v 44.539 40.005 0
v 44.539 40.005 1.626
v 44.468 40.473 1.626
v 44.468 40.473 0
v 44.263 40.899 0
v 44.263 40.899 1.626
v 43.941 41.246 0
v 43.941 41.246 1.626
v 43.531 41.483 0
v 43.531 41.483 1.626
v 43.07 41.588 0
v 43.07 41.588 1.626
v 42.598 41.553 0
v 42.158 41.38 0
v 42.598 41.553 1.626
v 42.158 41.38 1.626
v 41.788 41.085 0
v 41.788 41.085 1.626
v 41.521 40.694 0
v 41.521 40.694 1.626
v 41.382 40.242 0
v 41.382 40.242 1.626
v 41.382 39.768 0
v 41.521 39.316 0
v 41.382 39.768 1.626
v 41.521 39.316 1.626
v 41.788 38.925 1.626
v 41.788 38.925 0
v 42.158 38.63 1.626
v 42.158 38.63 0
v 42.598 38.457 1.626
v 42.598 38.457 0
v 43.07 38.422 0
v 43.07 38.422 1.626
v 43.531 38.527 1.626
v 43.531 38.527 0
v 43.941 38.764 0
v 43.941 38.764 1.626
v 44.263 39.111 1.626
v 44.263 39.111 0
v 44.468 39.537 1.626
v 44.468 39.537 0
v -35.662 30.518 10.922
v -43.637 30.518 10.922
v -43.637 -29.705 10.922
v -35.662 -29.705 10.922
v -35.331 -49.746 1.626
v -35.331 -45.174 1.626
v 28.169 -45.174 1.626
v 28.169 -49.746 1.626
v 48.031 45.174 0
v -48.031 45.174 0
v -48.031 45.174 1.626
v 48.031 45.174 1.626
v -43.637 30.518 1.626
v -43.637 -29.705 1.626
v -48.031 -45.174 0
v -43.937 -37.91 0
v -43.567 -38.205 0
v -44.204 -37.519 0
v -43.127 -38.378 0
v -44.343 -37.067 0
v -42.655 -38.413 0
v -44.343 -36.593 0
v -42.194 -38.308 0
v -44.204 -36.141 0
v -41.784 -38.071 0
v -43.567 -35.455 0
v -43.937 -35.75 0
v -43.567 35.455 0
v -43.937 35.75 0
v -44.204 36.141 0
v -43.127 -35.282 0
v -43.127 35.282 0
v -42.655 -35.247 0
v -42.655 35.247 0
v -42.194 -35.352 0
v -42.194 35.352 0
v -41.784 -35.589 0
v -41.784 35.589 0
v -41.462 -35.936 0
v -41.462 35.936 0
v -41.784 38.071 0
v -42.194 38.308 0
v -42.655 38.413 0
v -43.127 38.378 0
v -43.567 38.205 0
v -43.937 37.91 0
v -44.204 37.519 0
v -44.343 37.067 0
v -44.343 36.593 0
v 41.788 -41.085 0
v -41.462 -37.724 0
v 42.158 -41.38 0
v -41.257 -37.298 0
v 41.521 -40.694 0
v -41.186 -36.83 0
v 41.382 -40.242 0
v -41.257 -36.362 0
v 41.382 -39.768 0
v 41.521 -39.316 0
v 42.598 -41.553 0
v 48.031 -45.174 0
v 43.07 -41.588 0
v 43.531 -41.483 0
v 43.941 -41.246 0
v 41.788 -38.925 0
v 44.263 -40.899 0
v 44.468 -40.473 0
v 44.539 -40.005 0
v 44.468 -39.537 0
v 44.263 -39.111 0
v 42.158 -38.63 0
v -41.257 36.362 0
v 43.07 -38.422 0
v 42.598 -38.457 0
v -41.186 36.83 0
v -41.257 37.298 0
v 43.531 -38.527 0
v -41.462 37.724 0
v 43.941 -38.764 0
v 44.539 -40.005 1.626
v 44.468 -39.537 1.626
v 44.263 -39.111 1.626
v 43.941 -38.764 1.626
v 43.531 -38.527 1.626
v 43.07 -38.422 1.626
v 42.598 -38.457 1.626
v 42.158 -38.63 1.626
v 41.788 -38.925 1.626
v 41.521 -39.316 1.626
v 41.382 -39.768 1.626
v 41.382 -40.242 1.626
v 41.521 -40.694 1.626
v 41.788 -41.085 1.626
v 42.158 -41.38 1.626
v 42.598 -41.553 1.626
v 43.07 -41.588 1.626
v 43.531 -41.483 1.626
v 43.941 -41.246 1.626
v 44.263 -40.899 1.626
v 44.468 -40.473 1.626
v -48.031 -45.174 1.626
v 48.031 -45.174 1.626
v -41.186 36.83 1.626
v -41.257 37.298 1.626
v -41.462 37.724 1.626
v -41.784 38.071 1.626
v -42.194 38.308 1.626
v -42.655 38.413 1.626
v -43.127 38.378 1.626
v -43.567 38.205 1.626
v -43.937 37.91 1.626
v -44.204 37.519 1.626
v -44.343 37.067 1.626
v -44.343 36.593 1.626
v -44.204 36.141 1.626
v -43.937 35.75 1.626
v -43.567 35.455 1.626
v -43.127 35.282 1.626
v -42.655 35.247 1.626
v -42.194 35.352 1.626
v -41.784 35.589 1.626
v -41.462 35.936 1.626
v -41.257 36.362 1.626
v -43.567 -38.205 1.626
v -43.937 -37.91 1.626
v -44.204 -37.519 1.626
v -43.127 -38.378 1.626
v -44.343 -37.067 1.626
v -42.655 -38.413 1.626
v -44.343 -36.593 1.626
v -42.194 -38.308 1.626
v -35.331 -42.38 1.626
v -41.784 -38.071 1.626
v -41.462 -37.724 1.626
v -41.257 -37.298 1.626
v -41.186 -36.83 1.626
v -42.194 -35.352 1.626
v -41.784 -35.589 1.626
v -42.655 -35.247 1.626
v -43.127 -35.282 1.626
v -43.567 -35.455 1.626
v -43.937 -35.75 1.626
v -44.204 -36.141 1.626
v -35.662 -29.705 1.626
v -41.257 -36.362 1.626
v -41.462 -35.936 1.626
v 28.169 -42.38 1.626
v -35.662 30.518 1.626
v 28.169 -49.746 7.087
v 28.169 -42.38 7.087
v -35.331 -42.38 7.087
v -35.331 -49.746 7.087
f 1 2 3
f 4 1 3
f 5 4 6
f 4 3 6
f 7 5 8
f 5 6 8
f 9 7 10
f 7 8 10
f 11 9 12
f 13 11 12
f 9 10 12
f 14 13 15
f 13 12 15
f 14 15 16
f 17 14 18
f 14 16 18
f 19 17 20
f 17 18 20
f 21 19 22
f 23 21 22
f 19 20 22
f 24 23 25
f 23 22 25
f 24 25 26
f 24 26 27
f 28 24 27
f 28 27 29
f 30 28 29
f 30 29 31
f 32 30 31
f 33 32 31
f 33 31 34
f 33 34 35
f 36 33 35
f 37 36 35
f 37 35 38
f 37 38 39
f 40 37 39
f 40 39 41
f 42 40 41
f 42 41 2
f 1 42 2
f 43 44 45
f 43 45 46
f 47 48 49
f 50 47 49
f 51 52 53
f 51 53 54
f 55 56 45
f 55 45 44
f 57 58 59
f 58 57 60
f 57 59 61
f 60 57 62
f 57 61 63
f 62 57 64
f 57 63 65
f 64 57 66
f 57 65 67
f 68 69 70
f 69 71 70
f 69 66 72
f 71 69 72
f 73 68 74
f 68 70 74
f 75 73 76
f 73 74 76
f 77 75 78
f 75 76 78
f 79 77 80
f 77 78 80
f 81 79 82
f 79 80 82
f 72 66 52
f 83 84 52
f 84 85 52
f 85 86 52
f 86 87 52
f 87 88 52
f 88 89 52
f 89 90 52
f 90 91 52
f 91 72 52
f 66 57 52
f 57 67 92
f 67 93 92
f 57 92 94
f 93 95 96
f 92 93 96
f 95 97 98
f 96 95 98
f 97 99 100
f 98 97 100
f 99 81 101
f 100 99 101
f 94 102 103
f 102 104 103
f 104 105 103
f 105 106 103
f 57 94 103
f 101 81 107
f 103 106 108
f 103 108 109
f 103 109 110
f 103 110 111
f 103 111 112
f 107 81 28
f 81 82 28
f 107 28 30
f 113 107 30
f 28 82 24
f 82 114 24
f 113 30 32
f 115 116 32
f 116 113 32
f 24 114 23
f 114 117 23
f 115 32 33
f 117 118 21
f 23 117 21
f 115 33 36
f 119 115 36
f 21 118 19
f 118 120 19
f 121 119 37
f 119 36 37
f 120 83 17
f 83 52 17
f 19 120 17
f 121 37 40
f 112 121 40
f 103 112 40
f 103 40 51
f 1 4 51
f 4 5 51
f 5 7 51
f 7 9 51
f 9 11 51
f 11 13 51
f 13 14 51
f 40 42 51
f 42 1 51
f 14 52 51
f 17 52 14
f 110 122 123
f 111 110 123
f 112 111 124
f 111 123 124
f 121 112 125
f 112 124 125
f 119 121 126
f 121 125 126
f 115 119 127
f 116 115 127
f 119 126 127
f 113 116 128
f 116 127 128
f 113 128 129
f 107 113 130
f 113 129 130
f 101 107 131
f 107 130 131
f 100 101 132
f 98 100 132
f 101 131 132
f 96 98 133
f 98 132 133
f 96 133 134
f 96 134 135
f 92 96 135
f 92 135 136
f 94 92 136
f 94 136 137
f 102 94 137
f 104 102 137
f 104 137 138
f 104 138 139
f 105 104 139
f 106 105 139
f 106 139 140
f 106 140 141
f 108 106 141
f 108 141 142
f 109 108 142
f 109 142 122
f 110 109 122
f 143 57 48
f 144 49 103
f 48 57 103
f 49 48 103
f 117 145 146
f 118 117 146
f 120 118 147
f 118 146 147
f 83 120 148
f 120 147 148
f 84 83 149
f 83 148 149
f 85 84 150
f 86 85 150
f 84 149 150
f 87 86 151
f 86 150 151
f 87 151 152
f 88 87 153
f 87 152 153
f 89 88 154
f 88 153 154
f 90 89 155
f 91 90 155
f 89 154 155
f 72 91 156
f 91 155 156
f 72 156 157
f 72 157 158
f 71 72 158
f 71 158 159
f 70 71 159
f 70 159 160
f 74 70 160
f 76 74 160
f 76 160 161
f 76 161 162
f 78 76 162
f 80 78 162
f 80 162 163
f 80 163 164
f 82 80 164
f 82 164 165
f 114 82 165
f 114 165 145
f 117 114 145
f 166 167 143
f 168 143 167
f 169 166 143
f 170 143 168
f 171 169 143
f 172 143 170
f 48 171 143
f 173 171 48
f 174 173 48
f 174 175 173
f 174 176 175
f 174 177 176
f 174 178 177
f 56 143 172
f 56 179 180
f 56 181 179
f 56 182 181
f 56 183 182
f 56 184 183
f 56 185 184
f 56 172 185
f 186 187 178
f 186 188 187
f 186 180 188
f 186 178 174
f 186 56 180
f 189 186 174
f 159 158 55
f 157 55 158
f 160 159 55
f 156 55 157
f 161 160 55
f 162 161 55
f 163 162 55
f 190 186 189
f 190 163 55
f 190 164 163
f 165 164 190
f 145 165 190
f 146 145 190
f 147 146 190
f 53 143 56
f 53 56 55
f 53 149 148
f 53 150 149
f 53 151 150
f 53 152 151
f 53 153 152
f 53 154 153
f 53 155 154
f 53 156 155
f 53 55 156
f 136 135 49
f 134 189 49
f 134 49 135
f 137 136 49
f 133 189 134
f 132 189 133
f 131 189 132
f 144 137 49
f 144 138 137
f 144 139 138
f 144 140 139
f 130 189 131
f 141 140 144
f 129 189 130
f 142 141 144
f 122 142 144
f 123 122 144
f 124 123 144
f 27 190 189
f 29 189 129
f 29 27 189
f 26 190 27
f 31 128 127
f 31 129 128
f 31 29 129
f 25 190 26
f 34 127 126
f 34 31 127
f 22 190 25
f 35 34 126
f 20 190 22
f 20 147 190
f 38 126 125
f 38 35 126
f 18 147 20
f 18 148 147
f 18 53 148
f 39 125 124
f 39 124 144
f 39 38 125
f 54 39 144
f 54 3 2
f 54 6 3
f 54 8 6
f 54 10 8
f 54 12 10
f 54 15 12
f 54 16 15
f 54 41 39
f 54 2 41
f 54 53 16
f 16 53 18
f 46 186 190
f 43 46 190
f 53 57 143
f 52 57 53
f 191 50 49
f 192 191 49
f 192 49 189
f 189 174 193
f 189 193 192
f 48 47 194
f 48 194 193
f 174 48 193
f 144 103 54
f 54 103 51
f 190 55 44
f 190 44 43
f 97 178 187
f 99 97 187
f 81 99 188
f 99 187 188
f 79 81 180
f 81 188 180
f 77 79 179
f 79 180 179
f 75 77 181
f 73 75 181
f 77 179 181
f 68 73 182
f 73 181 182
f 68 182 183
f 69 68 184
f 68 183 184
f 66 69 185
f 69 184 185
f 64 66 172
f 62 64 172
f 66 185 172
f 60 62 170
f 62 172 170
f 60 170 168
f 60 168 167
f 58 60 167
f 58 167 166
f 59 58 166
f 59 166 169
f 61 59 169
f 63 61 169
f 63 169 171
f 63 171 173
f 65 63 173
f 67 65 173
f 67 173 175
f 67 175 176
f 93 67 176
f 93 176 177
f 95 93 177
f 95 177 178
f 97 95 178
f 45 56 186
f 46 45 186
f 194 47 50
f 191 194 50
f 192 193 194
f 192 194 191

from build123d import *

# Parameters (mm, degrees)
SKETCH1_W               = 96.0628
SKETCH1_H               = 90.3478
PCB_DEPTH               = 1.6256
SKETCH5_R               = 1.5875
PCB_HOLES_DEPTH         = 66.957101229
SKETCH2_W               = 7.9756
SKETCH2_H               = 60.2234
PCI_104_CONNECTOR_DEPTH = 9.2964
SKETCH6_W               = 63.5
SKETCH6_H               = 7.366
PCB_EDGE_CONNS_DEPTH    = 5.461


with BuildPart() as part:
    # Sketch1 → PCB (new body)
    with BuildSketch(Plane.XY):
        Rectangle(SKETCH1_W, SKETCH1_H)
    extrude(amount=PCB_DEPTH)

    # Sketch5 → PCB_Holes (cut, through all)
    with BuildSketch(Plane.XY.offset(1.6256)):
        with Locations((-42.7736, 36.83)):
            Circle(SKETCH5_R)
        with Locations((42.9514, 40.005)):
            Circle(SKETCH5_R)
        with Locations((42.9514, -40.005)):
            Circle(SKETCH5_R)
        with Locations((-42.7736, -36.83)):
            Circle(SKETCH5_R)
    extrude(amount=-PCB_HOLES_DEPTH, mode=Mode.SUBTRACT)

    # Sketch2 → PCI-104_Connector (add)
    with BuildSketch(Plane.XY.offset(1.6256)):
        with Locations((-39.6494, 0.4064)):
            Rectangle(SKETCH2_W, SKETCH2_H)
    extrude(amount=PCI_104_CONNECTOR_DEPTH)

    # Sketch6 → PCB_Edge_Conns (add)
    with BuildSketch(Plane.XY.offset(1.6256)):
        with Locations((-3.5814, -46.0629)):
            Rectangle(SKETCH6_W, SKETCH6_H)
    extrude(amount=PCB_EDGE_CONNS_DEPTH)


solid = part.part
